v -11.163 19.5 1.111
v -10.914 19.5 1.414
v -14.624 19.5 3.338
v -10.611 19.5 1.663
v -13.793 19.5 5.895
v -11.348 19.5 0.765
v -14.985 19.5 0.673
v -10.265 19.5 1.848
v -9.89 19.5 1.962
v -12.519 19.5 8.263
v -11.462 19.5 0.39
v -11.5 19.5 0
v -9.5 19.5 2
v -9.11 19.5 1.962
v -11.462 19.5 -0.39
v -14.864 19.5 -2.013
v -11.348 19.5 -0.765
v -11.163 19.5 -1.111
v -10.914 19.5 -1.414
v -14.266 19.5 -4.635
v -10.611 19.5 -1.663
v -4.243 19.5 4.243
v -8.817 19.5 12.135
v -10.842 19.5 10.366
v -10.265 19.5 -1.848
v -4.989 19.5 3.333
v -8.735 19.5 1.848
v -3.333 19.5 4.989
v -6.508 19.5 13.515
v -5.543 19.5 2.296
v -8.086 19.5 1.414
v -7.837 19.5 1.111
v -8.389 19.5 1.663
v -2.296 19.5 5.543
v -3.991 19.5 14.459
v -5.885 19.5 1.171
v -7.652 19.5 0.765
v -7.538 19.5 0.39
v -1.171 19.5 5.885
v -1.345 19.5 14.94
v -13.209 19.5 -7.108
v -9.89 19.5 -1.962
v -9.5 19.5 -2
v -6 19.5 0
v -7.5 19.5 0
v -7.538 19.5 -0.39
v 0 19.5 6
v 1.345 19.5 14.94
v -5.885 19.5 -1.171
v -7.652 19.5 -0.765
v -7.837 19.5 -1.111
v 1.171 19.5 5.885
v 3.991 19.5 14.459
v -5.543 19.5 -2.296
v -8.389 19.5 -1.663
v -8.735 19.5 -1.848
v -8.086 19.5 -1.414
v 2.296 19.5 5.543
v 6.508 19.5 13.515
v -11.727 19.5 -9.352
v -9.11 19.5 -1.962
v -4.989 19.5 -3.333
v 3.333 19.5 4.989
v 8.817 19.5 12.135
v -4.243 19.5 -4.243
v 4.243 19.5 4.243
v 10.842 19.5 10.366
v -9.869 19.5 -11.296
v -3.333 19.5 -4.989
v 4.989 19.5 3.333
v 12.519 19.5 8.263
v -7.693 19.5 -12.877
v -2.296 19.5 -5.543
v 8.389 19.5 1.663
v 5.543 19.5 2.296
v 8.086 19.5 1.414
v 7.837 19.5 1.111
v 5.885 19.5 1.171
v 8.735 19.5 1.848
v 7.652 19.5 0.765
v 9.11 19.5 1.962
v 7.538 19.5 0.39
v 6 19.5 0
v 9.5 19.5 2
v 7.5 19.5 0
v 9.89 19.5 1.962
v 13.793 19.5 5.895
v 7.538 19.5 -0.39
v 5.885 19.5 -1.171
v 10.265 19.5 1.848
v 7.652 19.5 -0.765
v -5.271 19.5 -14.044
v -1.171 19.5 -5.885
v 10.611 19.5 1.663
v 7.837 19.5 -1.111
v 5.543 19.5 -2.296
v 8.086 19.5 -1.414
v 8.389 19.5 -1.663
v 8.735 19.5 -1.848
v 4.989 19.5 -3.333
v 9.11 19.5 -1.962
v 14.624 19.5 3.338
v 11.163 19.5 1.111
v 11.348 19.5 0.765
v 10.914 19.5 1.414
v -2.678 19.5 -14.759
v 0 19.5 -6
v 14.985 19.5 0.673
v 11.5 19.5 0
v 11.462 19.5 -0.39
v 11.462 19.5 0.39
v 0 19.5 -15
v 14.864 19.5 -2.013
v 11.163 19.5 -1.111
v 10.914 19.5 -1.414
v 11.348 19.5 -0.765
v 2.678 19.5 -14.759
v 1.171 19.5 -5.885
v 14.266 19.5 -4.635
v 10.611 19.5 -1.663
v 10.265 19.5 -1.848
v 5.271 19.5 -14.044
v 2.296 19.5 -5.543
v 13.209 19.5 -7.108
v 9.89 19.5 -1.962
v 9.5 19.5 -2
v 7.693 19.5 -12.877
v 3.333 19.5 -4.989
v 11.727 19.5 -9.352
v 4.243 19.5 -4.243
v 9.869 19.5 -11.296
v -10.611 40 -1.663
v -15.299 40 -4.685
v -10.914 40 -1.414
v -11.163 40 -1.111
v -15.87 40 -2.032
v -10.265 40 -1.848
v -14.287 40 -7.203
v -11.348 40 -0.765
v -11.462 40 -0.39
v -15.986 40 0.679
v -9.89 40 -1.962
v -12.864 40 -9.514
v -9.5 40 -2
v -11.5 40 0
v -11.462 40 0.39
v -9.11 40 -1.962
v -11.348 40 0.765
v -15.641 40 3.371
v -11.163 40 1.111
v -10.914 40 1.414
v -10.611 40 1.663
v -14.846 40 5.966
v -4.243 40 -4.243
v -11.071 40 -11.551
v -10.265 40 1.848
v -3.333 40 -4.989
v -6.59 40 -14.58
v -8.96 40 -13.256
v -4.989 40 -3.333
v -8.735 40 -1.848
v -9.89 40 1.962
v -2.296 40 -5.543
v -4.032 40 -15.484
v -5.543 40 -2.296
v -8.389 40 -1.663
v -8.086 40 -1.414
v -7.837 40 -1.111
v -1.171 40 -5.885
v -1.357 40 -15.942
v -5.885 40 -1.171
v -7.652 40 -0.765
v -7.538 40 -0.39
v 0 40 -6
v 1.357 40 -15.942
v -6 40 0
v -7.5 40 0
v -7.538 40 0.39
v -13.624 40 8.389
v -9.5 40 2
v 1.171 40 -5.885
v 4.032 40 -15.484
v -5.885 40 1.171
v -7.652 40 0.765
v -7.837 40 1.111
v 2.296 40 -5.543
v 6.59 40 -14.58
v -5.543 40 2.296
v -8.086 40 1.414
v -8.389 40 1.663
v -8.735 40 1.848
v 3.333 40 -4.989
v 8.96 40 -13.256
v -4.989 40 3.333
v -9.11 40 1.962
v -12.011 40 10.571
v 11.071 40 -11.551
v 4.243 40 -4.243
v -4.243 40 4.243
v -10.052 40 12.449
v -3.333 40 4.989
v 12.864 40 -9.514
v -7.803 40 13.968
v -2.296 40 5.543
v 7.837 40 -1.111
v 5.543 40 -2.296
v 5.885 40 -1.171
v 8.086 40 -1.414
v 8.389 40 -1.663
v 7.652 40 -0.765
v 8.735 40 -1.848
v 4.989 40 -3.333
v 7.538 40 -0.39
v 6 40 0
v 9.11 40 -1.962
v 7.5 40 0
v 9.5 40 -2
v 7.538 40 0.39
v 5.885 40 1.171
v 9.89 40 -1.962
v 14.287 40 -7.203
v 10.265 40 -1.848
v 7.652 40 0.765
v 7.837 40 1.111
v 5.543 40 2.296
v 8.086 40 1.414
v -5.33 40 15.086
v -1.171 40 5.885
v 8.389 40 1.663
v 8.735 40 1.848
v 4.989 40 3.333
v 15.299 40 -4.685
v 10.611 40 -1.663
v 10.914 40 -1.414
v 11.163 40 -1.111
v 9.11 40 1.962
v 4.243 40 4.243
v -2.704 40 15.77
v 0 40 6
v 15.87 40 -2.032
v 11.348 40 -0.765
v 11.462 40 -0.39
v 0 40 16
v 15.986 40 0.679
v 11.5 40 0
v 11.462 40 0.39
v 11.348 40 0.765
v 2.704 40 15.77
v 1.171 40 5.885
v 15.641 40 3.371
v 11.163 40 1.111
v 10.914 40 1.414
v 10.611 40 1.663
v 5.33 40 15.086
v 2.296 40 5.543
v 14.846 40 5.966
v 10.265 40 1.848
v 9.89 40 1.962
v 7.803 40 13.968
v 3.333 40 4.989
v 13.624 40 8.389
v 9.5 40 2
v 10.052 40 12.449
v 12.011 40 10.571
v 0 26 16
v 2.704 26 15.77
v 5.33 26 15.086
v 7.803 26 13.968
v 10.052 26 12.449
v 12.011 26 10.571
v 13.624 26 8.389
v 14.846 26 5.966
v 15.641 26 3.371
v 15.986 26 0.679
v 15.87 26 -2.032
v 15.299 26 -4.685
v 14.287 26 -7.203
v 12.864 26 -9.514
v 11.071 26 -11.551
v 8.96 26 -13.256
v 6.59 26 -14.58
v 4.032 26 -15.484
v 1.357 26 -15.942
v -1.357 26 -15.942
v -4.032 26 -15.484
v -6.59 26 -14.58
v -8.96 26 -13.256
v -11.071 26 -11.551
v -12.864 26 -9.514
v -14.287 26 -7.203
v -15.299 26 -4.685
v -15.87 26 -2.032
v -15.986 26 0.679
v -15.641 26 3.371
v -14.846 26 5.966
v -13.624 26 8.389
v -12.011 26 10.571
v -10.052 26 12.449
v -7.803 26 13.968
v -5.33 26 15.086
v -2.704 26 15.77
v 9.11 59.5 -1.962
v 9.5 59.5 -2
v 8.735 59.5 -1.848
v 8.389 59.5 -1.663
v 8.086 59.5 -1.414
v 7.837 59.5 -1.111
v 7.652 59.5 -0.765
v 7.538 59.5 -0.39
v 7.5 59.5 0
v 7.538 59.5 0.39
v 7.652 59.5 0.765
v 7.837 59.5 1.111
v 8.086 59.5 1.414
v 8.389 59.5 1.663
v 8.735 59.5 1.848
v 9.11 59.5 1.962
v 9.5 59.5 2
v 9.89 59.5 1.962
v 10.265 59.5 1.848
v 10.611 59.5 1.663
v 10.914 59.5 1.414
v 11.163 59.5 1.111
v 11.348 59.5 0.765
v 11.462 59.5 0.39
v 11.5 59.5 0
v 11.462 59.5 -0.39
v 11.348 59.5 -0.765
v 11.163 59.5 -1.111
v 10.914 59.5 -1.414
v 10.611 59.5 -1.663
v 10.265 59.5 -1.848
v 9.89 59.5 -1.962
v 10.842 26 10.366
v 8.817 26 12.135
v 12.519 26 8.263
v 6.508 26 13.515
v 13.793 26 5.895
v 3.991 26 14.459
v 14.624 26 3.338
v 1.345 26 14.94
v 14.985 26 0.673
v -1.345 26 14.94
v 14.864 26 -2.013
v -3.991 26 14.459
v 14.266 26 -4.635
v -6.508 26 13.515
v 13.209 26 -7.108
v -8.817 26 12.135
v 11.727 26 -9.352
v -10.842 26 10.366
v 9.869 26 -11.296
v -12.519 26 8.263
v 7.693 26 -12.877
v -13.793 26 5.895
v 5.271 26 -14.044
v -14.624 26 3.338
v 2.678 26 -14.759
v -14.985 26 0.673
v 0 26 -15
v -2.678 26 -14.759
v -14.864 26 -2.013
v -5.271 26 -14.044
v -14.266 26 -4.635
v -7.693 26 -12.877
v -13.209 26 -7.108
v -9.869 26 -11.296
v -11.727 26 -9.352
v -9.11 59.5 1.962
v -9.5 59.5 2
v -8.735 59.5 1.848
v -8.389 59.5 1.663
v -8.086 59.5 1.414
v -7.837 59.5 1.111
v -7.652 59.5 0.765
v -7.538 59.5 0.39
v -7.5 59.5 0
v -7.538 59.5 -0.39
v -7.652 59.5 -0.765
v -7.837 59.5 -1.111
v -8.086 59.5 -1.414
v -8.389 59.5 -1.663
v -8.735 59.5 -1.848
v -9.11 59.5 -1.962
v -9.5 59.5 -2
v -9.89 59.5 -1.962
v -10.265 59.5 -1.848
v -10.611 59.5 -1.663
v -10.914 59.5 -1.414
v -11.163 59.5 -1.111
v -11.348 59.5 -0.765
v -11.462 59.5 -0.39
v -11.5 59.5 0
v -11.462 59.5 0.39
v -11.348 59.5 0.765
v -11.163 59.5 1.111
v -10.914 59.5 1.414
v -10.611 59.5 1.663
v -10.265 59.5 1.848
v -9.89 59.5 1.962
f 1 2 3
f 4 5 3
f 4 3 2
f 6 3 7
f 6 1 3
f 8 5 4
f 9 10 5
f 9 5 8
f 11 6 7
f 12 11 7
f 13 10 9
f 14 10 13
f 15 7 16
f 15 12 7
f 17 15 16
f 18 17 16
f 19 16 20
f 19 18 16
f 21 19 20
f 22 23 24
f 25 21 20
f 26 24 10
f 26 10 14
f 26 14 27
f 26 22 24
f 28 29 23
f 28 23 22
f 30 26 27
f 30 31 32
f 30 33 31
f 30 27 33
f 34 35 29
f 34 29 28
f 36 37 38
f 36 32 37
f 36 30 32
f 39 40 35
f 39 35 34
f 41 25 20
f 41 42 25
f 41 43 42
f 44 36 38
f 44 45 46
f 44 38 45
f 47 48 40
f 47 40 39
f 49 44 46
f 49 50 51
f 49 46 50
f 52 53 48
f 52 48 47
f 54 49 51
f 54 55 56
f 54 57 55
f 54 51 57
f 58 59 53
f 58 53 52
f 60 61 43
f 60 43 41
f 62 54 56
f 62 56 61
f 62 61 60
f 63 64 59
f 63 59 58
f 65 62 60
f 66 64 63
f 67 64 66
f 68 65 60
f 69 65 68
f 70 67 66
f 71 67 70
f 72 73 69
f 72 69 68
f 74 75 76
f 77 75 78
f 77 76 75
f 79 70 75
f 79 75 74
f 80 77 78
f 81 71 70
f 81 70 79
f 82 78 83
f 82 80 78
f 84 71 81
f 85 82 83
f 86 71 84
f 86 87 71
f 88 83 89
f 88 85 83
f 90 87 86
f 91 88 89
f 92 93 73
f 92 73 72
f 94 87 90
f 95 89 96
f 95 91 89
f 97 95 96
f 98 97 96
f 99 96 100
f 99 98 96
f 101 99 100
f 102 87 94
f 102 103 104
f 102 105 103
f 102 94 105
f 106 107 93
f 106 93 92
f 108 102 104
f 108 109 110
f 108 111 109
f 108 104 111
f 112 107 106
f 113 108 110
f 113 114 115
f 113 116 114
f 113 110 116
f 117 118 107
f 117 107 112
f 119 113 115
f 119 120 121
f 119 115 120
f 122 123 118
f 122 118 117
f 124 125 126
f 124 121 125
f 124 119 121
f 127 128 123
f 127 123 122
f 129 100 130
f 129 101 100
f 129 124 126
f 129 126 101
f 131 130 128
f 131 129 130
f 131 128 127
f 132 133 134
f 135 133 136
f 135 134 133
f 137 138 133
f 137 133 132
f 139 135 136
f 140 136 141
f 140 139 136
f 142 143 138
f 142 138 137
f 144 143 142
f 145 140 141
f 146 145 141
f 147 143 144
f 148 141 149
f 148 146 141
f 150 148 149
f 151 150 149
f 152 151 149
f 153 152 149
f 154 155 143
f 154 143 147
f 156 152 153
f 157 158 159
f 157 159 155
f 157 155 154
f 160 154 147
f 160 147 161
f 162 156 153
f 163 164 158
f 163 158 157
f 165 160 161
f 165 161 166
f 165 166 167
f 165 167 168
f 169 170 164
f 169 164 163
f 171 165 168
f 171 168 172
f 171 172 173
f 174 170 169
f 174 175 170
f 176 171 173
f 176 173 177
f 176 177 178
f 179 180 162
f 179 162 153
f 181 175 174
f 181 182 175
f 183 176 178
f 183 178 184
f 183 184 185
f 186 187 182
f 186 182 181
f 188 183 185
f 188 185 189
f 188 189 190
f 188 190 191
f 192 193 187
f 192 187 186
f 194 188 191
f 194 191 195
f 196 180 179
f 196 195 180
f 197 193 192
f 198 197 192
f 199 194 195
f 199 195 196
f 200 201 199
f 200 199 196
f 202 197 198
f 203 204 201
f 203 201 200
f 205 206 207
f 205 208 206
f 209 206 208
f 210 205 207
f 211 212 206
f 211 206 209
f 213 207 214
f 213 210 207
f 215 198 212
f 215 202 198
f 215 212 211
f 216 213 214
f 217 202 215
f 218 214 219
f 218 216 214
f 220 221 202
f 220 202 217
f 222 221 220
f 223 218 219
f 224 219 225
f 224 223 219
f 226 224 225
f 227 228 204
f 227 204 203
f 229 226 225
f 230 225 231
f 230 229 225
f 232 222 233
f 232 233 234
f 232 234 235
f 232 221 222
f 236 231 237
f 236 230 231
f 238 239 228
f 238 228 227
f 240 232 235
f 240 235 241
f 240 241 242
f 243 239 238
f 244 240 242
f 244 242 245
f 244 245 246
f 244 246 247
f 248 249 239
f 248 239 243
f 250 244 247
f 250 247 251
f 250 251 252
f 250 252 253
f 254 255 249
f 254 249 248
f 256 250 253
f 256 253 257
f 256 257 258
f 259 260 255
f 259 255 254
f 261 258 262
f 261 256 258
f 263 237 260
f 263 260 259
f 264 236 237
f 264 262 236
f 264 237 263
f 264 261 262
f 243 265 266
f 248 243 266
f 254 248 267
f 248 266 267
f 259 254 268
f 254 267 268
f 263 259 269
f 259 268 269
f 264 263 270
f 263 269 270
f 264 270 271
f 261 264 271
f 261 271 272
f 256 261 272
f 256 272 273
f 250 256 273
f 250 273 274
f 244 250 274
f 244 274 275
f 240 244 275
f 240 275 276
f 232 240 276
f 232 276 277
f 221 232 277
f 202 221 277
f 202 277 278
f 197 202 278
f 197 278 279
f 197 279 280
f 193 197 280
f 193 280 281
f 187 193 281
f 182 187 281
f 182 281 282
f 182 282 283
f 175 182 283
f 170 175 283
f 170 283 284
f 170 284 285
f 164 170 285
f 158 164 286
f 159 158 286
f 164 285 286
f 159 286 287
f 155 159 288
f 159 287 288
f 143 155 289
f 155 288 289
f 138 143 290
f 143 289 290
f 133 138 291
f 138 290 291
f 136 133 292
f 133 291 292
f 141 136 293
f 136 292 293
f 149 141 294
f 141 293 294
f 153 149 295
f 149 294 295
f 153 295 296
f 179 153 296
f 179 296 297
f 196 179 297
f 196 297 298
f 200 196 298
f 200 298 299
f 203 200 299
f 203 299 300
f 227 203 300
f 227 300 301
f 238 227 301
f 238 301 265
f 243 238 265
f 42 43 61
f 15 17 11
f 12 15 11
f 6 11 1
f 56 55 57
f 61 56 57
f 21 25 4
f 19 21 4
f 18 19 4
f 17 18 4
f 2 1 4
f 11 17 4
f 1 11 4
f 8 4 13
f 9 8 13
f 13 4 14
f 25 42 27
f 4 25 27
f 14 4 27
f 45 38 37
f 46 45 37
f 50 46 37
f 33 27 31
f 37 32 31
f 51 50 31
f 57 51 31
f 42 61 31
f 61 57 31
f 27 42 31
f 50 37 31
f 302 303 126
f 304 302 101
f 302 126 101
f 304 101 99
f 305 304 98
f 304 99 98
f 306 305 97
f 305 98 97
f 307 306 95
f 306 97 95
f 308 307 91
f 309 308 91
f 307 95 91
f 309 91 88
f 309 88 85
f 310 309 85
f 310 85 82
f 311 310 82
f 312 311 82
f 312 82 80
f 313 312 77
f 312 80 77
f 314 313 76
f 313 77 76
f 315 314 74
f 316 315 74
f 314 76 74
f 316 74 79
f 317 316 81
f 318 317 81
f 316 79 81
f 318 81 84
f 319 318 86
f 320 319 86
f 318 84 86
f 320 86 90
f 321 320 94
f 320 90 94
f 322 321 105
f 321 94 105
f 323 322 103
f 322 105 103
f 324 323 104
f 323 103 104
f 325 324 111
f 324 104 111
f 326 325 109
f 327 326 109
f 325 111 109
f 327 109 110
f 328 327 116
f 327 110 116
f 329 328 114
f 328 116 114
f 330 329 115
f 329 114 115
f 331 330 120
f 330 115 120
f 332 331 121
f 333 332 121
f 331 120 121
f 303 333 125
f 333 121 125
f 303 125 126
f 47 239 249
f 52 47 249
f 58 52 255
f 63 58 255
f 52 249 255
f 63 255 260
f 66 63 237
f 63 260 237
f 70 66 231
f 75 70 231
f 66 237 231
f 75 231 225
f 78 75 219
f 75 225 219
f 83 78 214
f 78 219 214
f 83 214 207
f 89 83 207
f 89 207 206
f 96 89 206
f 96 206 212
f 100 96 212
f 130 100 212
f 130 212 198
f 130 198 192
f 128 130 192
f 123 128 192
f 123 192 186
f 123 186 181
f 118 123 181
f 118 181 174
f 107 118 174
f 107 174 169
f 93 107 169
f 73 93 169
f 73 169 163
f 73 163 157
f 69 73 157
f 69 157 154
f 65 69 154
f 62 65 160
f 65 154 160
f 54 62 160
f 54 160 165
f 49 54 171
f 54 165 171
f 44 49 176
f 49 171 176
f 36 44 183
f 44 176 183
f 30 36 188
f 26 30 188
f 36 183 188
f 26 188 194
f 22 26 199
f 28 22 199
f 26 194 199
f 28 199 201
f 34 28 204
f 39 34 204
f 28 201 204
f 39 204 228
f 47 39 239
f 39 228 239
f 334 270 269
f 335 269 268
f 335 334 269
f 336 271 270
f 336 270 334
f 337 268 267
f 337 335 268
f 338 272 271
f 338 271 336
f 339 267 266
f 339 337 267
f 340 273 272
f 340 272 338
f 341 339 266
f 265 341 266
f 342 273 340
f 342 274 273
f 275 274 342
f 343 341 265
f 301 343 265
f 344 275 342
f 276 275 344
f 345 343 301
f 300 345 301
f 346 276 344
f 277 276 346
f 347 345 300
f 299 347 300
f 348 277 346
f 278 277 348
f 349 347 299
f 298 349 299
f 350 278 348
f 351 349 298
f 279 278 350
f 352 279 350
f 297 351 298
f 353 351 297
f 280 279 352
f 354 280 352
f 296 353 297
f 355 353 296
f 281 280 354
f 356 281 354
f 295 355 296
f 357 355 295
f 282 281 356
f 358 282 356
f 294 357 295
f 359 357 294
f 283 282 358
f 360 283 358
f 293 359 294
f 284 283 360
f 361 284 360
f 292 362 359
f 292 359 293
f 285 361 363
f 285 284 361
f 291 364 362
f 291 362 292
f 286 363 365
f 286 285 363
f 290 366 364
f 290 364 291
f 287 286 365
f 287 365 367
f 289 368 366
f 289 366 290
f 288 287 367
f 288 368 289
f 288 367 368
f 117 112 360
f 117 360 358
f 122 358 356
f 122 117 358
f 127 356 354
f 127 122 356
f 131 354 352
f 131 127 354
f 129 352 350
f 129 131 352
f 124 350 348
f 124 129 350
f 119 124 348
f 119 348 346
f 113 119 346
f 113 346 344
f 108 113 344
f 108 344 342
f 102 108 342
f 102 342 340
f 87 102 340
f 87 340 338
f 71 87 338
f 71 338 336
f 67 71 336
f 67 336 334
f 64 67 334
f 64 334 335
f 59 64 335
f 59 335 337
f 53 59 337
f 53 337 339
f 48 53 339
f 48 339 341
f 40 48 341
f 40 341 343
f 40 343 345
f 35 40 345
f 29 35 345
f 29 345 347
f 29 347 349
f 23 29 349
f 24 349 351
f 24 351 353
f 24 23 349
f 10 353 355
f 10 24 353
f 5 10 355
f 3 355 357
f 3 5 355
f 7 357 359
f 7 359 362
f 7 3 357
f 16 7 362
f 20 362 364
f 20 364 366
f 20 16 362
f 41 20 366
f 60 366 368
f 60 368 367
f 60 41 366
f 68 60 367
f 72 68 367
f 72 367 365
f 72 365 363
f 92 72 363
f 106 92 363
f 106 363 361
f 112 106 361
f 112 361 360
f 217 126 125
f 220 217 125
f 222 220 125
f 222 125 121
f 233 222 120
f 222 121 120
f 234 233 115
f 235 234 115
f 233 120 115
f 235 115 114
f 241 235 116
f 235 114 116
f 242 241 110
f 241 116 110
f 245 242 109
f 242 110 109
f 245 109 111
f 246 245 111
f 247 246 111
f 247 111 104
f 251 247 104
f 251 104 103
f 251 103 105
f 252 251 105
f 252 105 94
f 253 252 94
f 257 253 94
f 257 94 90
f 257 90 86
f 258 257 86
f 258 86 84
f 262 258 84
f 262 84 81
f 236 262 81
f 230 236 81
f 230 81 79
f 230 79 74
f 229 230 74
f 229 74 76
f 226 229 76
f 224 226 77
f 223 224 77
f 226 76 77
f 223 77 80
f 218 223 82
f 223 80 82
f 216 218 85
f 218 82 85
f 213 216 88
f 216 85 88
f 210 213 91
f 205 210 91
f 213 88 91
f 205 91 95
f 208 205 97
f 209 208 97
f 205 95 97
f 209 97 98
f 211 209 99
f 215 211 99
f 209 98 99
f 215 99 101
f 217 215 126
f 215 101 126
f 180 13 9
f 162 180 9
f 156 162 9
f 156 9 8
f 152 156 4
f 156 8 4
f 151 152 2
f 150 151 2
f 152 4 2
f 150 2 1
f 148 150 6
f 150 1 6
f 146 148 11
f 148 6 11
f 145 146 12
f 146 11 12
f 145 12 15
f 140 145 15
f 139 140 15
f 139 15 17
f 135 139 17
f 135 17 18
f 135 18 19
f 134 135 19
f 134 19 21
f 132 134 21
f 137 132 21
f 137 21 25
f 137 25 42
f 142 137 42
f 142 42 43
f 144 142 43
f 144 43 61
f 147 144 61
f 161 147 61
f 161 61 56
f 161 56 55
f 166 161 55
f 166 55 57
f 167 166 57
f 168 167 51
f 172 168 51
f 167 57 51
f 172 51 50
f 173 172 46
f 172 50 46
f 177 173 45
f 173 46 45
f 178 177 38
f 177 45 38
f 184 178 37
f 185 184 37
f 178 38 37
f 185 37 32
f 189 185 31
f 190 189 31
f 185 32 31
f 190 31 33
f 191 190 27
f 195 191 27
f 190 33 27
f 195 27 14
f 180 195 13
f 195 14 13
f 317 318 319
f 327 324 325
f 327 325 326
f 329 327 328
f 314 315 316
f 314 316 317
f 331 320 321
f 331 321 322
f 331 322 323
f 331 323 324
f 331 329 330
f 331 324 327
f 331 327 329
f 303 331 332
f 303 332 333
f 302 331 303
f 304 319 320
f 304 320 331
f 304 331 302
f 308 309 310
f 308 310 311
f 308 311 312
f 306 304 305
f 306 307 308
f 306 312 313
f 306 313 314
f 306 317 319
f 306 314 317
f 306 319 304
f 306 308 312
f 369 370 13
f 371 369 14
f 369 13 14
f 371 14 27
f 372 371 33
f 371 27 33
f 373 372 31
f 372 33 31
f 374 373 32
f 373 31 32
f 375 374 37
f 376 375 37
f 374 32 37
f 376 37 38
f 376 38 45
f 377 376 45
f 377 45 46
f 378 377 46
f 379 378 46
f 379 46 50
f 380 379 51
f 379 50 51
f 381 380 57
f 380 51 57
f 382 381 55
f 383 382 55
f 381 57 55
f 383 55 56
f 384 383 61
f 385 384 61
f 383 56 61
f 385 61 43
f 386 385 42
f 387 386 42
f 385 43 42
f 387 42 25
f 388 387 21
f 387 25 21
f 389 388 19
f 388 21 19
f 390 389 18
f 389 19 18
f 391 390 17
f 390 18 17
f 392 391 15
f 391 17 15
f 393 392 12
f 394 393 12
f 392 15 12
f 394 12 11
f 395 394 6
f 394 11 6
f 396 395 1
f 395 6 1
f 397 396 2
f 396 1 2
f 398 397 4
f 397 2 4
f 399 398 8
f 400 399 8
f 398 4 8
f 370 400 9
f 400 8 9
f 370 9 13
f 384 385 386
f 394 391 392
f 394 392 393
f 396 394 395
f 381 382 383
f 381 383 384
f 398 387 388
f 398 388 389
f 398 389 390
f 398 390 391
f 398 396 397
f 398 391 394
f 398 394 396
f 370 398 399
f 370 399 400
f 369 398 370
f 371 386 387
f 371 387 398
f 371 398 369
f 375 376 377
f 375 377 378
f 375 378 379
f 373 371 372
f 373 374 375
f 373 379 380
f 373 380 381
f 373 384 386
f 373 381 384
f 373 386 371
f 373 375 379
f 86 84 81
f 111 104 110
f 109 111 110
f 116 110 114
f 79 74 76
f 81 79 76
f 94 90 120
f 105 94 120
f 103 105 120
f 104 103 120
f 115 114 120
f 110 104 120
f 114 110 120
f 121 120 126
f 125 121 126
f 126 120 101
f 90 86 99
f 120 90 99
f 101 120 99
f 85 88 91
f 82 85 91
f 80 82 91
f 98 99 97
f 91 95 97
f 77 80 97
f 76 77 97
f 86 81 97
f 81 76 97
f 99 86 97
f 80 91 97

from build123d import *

# Parameters (mm, degrees)
SKETCH1_R             = 16
BOSS_EXTRUDE1_DEPTH   = 40
SKETCH2_R             = 6
CUT_EXTRUDE1_DEPTH    = 46.956501172
SKETCH4_R             = 20
SKETCH4_R_2           = 15
CUT_EXTRUDE2_DEPTH    = 26
SKETCH5_R             = 15
CUT_EXTRUDE3_DEPTH    = 19.5
SKETCH3_R             = 2
BOSS_EXTRUDE2_DEPTH   = 40
BOSS_EXTRUDE2_2_DEPTH = 40
SKETCH7_R             = 2
CUT_EXTRUDE5_DEPTH    = 64.657285522


with BuildPart() as part:
    # Sketch1 → Boss-Extrude1 (new body)
    with BuildSketch(Plane(origin=(0, 0, 0), x_dir=(1, 0, 0), z_dir=(0, 1, 0))):
        with Locations(Location((0, 0, 0), (0, 0, 270))):
            Circle(SKETCH1_R)
    extrude(amount=BOSS_EXTRUDE1_DEPTH)

    # Sketch2 → Cut-Extrude1 (cut, through all)
    with BuildSketch(Plane(origin=(0, 40, 0), x_dir=(1, 0, 0), z_dir=(0, 1, 0))):
        with Locations(Location((0, 0, 0), (0, 0, 270))):
            Circle(SKETCH2_R)
    extrude(amount=-CUT_EXTRUDE1_DEPTH, mode=Mode.SUBTRACT)

    # Sketch4 → Cut-Extrude2 (cut)
    with BuildSketch(Plane(origin=(0, 0, 0), x_dir=(-1, 0, 0), z_dir=(0, -1, 0))):
        Circle(SKETCH4_R)
        with Locations(Location((0, 0, 0), (0, 0, 90))):
            Circle(SKETCH4_R_2, mode=Mode.SUBTRACT)
    extrude(amount=-CUT_EXTRUDE2_DEPTH, mode=Mode.SUBTRACT)

    # Sketch5 → Cut-Extrude3 (cut)
    with BuildSketch(Plane.XZ):
        with Locations(Location((0, 0, 0), (0, 0, 270))):
            Circle(SKETCH5_R)
    extrude(amount=-CUT_EXTRUDE3_DEPTH, mode=Mode.SUBTRACT)

    # Sketch7 → Cut-Extrude5 (cut, through all)
    with BuildSketch(Plane(origin=(0, 0, 0), x_dir=(-1, 0, 0), z_dir=(0, -1, 0))):
        with Locations(Location((9.5, 0, 0), (0, 0, 270))):
            Circle(SKETCH7_R)
        with Locations(Location((-9.5, 0, 0), (0, 0, 90))):
            Circle(SKETCH7_R)
    extrude(amount=-CUT_EXTRUDE5_DEPTH, mode=Mode.SUBTRACT)


with BuildPart() as body_2:
    # Sketch3 → Boss-Extrude2 (new body)
    with BuildSketch(Plane(origin=(0, 19.5, 0), x_dir=(1, 0, 0), z_dir=(0, 1, 0))):
        with Locations(Location((-9.5, 0, 0), (0, 0, 270))):
            Circle(SKETCH3_R)
    extrude(amount=BOSS_EXTRUDE2_DEPTH)


with BuildPart() as body_3:
    # Sketch3 → Boss-Extrude2 2 (new body)
    with BuildSketch(Plane(origin=(0, 19.5, 0), x_dir=(1, 0, 0), z_dir=(0, 1, 0))):
        with Locations(Location((9.5, 0, 0), (0, 0, 90))):
            Circle(SKETCH3_R)
    extrude(amount=BOSS_EXTRUDE2_2_DEPTH)


solid = Compound([part.part, body_2.part, body_3.part])
